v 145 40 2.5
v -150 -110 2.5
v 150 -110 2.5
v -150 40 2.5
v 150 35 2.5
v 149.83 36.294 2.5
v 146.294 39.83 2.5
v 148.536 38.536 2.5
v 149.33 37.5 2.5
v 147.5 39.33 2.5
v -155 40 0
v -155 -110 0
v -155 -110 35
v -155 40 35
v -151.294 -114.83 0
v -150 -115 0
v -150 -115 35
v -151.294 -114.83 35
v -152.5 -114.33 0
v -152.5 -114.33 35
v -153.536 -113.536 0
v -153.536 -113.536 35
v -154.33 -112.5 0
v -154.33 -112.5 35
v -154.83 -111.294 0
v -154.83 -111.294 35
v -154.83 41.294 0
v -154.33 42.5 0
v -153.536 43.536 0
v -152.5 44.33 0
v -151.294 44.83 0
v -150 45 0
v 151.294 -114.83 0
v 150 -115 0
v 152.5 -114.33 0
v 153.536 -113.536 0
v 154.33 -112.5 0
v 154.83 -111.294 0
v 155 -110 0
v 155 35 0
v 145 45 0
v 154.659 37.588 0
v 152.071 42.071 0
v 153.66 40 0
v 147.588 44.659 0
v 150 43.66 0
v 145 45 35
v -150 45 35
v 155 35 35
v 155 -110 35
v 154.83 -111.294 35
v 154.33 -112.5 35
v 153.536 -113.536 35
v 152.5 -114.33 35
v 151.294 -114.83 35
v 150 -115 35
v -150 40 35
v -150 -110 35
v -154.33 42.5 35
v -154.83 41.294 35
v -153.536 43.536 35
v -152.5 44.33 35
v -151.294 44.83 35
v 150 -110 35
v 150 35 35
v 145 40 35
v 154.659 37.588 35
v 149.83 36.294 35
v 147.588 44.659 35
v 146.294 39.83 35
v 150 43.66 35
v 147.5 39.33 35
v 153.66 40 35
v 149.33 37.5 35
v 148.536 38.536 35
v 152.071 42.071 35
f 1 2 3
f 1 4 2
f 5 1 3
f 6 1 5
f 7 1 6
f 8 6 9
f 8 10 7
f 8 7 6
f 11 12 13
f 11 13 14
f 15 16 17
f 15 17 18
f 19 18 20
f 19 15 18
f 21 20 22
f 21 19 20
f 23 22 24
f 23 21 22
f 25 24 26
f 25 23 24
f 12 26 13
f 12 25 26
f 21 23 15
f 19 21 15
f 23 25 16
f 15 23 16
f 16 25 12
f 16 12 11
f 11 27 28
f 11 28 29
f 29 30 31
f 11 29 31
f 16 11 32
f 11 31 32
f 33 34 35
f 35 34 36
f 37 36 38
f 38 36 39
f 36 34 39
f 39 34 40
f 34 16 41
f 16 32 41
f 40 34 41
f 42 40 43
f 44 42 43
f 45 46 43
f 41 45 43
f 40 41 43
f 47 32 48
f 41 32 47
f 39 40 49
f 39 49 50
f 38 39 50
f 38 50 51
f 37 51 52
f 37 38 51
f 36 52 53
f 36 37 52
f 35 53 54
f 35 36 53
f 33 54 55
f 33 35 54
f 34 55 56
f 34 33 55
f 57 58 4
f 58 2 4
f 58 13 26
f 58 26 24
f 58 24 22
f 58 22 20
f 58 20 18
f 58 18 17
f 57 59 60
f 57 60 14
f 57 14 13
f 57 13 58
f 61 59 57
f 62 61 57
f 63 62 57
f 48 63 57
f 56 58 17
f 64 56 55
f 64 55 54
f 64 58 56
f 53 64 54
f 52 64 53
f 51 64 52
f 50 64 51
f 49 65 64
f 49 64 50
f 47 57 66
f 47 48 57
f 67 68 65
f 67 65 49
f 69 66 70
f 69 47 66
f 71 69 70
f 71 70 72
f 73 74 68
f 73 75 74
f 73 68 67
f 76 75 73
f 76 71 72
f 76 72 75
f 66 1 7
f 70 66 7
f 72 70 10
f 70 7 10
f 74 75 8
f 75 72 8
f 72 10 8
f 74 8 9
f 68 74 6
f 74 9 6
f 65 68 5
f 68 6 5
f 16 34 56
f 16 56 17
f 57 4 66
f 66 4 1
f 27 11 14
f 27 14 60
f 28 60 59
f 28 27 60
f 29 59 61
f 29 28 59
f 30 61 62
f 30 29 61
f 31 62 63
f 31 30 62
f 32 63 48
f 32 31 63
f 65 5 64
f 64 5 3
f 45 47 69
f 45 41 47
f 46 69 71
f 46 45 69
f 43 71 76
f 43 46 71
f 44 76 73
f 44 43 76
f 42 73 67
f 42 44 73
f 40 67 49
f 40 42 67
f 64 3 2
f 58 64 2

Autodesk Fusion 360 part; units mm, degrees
sketch "Sketch1" plane through (0, 0, 0) normal (0, 0, 1) x (1, 0, 0)
  line L0 (-150, 40) -> (145, 40)
  line L1 (150, 35) -> (150, -110)
  line L2 (150, -110) -> (-150, -110)
  line L3 (-150, -110) -> (-150, 40)
  arc A0 (150, 35) -> (145, 40) centre (145, 35) ccw
  line L4 (155, 35) -> (155, -110)
  line L5 (150, -115) -> (-150, -115)
  line L6 (-155, -110) -> (-155, 40)
  line L7 (-150, 45) -> (145, 45)
  arc A1 (155, 35) -> (145, 45) centre (145, 35) ccw
  arc A2 (-150, 45) -> (-155, 40) centre (-150, 40) ccw
  arc A3 (-155, -110) -> (-150, -115) centre (-150, -110) ccw
  arc A4 (150, -115) -> (155, -110) centre (150, -110) ccw
  point P0 (150, 40)
  dimension "d1" = 300
  dimension "d2" = 150
  dimension "d4" = 5
  dimension "d5" = 5
  dimension "d6" = 5
  dimension "d7" = 5
  dimension "d8" = 5
extrude "Extrude1" add sketch "Sketch1" along normal blind 20
extrude "Extrude2" add sketch "Sketch1" along normal blind 2.5 contours L0 L1 L2 L3 A0
extrude "Extrude3" add 1 faces at (50, -111.6667, 20) along direction (0, 0, 1) blind 15
